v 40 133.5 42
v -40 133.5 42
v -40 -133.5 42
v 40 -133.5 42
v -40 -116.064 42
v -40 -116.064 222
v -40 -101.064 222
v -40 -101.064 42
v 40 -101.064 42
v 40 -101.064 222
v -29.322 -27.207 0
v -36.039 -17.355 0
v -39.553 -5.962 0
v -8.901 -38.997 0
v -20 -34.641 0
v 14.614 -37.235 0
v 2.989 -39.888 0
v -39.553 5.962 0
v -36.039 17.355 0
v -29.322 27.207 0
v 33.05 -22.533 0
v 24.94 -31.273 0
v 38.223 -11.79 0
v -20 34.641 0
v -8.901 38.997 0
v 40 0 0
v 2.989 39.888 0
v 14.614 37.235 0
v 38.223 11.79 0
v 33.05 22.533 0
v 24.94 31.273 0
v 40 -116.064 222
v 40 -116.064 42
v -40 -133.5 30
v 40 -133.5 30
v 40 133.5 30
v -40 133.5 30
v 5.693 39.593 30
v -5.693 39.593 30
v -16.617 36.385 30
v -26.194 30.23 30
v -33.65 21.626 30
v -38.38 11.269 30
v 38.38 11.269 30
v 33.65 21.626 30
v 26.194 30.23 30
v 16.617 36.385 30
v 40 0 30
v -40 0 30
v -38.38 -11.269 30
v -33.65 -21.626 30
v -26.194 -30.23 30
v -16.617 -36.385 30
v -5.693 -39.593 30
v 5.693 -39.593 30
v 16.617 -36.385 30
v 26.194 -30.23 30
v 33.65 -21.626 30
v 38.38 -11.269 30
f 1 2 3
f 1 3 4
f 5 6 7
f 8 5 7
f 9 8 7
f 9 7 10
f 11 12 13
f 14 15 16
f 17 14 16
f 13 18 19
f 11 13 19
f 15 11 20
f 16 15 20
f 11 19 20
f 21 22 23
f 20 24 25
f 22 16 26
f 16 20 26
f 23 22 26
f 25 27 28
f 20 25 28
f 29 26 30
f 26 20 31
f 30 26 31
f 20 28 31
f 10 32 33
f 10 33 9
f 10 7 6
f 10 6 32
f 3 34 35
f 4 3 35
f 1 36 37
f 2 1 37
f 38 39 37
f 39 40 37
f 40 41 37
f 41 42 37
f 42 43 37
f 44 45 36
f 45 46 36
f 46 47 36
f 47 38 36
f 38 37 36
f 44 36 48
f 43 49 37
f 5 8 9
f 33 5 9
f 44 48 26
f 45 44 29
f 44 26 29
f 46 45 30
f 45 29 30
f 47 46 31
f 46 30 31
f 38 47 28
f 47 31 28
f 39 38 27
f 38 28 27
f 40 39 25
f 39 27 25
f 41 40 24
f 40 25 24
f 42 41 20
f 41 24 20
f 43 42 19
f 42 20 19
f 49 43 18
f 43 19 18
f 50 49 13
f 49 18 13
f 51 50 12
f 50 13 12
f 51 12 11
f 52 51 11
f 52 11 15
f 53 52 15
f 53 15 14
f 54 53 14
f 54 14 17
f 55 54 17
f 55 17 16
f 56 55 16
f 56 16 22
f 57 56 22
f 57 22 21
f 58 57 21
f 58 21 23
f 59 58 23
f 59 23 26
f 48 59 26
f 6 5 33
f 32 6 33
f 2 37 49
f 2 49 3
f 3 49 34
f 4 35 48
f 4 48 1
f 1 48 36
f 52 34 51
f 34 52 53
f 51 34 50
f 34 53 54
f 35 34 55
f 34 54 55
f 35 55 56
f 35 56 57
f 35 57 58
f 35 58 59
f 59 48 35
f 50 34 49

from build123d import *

# Parameters (mm, degrees)
F0_R     = 40
F1_DEPTH = 30
F3_DEPTH = 12
F4_W     = 80
F4_H     = 15
F5_DEPTH = 180


with BuildPart() as f1:
    # F0 (on Top) → F1 (new body)
    with BuildSketch(Plane.XY):
        Circle(F0_R)
    extrude(amount=F1_DEPTH)

    # F2 (on face) → F3 (join)
    with BuildSketch(Plane.XY.offset(30)):
        with BuildLine():
            Line((40, 0), (40, 133.5))
            Line((40, 133.5), (-40, 133.5))
            Line((-40, 133.5), (-40, 0))
            ThreePointArc((-40, 0), (0, 40), (40, 0))
        make_face()
        with BuildLine():
            Line((40, -133.5), (40, 0))
            ThreePointArc((40, 0), (0, -40), (-40, 0))
            Line((-40, 0), (-40, -133.5))
            Line((-40, -133.5), (40, -133.5))
        make_face()
        with BuildLine():
            ThreePointArc((-40, 0), (0, -40), (40, 0))
            ThreePointArc((40, 0), (0, 40), (-40, 0))
        make_face()
    extrude(amount=F3_DEPTH)


with BuildPart() as f5:
    # F4 (on face) → F5 (new body)
    with BuildSketch(Plane.XY.offset(42)):
        with Locations((0, -108.563692)):
            Rectangle(F4_W, F4_H)
    extrude(amount=F5_DEPTH)


solid = Compound([f1.part, f5.part])
